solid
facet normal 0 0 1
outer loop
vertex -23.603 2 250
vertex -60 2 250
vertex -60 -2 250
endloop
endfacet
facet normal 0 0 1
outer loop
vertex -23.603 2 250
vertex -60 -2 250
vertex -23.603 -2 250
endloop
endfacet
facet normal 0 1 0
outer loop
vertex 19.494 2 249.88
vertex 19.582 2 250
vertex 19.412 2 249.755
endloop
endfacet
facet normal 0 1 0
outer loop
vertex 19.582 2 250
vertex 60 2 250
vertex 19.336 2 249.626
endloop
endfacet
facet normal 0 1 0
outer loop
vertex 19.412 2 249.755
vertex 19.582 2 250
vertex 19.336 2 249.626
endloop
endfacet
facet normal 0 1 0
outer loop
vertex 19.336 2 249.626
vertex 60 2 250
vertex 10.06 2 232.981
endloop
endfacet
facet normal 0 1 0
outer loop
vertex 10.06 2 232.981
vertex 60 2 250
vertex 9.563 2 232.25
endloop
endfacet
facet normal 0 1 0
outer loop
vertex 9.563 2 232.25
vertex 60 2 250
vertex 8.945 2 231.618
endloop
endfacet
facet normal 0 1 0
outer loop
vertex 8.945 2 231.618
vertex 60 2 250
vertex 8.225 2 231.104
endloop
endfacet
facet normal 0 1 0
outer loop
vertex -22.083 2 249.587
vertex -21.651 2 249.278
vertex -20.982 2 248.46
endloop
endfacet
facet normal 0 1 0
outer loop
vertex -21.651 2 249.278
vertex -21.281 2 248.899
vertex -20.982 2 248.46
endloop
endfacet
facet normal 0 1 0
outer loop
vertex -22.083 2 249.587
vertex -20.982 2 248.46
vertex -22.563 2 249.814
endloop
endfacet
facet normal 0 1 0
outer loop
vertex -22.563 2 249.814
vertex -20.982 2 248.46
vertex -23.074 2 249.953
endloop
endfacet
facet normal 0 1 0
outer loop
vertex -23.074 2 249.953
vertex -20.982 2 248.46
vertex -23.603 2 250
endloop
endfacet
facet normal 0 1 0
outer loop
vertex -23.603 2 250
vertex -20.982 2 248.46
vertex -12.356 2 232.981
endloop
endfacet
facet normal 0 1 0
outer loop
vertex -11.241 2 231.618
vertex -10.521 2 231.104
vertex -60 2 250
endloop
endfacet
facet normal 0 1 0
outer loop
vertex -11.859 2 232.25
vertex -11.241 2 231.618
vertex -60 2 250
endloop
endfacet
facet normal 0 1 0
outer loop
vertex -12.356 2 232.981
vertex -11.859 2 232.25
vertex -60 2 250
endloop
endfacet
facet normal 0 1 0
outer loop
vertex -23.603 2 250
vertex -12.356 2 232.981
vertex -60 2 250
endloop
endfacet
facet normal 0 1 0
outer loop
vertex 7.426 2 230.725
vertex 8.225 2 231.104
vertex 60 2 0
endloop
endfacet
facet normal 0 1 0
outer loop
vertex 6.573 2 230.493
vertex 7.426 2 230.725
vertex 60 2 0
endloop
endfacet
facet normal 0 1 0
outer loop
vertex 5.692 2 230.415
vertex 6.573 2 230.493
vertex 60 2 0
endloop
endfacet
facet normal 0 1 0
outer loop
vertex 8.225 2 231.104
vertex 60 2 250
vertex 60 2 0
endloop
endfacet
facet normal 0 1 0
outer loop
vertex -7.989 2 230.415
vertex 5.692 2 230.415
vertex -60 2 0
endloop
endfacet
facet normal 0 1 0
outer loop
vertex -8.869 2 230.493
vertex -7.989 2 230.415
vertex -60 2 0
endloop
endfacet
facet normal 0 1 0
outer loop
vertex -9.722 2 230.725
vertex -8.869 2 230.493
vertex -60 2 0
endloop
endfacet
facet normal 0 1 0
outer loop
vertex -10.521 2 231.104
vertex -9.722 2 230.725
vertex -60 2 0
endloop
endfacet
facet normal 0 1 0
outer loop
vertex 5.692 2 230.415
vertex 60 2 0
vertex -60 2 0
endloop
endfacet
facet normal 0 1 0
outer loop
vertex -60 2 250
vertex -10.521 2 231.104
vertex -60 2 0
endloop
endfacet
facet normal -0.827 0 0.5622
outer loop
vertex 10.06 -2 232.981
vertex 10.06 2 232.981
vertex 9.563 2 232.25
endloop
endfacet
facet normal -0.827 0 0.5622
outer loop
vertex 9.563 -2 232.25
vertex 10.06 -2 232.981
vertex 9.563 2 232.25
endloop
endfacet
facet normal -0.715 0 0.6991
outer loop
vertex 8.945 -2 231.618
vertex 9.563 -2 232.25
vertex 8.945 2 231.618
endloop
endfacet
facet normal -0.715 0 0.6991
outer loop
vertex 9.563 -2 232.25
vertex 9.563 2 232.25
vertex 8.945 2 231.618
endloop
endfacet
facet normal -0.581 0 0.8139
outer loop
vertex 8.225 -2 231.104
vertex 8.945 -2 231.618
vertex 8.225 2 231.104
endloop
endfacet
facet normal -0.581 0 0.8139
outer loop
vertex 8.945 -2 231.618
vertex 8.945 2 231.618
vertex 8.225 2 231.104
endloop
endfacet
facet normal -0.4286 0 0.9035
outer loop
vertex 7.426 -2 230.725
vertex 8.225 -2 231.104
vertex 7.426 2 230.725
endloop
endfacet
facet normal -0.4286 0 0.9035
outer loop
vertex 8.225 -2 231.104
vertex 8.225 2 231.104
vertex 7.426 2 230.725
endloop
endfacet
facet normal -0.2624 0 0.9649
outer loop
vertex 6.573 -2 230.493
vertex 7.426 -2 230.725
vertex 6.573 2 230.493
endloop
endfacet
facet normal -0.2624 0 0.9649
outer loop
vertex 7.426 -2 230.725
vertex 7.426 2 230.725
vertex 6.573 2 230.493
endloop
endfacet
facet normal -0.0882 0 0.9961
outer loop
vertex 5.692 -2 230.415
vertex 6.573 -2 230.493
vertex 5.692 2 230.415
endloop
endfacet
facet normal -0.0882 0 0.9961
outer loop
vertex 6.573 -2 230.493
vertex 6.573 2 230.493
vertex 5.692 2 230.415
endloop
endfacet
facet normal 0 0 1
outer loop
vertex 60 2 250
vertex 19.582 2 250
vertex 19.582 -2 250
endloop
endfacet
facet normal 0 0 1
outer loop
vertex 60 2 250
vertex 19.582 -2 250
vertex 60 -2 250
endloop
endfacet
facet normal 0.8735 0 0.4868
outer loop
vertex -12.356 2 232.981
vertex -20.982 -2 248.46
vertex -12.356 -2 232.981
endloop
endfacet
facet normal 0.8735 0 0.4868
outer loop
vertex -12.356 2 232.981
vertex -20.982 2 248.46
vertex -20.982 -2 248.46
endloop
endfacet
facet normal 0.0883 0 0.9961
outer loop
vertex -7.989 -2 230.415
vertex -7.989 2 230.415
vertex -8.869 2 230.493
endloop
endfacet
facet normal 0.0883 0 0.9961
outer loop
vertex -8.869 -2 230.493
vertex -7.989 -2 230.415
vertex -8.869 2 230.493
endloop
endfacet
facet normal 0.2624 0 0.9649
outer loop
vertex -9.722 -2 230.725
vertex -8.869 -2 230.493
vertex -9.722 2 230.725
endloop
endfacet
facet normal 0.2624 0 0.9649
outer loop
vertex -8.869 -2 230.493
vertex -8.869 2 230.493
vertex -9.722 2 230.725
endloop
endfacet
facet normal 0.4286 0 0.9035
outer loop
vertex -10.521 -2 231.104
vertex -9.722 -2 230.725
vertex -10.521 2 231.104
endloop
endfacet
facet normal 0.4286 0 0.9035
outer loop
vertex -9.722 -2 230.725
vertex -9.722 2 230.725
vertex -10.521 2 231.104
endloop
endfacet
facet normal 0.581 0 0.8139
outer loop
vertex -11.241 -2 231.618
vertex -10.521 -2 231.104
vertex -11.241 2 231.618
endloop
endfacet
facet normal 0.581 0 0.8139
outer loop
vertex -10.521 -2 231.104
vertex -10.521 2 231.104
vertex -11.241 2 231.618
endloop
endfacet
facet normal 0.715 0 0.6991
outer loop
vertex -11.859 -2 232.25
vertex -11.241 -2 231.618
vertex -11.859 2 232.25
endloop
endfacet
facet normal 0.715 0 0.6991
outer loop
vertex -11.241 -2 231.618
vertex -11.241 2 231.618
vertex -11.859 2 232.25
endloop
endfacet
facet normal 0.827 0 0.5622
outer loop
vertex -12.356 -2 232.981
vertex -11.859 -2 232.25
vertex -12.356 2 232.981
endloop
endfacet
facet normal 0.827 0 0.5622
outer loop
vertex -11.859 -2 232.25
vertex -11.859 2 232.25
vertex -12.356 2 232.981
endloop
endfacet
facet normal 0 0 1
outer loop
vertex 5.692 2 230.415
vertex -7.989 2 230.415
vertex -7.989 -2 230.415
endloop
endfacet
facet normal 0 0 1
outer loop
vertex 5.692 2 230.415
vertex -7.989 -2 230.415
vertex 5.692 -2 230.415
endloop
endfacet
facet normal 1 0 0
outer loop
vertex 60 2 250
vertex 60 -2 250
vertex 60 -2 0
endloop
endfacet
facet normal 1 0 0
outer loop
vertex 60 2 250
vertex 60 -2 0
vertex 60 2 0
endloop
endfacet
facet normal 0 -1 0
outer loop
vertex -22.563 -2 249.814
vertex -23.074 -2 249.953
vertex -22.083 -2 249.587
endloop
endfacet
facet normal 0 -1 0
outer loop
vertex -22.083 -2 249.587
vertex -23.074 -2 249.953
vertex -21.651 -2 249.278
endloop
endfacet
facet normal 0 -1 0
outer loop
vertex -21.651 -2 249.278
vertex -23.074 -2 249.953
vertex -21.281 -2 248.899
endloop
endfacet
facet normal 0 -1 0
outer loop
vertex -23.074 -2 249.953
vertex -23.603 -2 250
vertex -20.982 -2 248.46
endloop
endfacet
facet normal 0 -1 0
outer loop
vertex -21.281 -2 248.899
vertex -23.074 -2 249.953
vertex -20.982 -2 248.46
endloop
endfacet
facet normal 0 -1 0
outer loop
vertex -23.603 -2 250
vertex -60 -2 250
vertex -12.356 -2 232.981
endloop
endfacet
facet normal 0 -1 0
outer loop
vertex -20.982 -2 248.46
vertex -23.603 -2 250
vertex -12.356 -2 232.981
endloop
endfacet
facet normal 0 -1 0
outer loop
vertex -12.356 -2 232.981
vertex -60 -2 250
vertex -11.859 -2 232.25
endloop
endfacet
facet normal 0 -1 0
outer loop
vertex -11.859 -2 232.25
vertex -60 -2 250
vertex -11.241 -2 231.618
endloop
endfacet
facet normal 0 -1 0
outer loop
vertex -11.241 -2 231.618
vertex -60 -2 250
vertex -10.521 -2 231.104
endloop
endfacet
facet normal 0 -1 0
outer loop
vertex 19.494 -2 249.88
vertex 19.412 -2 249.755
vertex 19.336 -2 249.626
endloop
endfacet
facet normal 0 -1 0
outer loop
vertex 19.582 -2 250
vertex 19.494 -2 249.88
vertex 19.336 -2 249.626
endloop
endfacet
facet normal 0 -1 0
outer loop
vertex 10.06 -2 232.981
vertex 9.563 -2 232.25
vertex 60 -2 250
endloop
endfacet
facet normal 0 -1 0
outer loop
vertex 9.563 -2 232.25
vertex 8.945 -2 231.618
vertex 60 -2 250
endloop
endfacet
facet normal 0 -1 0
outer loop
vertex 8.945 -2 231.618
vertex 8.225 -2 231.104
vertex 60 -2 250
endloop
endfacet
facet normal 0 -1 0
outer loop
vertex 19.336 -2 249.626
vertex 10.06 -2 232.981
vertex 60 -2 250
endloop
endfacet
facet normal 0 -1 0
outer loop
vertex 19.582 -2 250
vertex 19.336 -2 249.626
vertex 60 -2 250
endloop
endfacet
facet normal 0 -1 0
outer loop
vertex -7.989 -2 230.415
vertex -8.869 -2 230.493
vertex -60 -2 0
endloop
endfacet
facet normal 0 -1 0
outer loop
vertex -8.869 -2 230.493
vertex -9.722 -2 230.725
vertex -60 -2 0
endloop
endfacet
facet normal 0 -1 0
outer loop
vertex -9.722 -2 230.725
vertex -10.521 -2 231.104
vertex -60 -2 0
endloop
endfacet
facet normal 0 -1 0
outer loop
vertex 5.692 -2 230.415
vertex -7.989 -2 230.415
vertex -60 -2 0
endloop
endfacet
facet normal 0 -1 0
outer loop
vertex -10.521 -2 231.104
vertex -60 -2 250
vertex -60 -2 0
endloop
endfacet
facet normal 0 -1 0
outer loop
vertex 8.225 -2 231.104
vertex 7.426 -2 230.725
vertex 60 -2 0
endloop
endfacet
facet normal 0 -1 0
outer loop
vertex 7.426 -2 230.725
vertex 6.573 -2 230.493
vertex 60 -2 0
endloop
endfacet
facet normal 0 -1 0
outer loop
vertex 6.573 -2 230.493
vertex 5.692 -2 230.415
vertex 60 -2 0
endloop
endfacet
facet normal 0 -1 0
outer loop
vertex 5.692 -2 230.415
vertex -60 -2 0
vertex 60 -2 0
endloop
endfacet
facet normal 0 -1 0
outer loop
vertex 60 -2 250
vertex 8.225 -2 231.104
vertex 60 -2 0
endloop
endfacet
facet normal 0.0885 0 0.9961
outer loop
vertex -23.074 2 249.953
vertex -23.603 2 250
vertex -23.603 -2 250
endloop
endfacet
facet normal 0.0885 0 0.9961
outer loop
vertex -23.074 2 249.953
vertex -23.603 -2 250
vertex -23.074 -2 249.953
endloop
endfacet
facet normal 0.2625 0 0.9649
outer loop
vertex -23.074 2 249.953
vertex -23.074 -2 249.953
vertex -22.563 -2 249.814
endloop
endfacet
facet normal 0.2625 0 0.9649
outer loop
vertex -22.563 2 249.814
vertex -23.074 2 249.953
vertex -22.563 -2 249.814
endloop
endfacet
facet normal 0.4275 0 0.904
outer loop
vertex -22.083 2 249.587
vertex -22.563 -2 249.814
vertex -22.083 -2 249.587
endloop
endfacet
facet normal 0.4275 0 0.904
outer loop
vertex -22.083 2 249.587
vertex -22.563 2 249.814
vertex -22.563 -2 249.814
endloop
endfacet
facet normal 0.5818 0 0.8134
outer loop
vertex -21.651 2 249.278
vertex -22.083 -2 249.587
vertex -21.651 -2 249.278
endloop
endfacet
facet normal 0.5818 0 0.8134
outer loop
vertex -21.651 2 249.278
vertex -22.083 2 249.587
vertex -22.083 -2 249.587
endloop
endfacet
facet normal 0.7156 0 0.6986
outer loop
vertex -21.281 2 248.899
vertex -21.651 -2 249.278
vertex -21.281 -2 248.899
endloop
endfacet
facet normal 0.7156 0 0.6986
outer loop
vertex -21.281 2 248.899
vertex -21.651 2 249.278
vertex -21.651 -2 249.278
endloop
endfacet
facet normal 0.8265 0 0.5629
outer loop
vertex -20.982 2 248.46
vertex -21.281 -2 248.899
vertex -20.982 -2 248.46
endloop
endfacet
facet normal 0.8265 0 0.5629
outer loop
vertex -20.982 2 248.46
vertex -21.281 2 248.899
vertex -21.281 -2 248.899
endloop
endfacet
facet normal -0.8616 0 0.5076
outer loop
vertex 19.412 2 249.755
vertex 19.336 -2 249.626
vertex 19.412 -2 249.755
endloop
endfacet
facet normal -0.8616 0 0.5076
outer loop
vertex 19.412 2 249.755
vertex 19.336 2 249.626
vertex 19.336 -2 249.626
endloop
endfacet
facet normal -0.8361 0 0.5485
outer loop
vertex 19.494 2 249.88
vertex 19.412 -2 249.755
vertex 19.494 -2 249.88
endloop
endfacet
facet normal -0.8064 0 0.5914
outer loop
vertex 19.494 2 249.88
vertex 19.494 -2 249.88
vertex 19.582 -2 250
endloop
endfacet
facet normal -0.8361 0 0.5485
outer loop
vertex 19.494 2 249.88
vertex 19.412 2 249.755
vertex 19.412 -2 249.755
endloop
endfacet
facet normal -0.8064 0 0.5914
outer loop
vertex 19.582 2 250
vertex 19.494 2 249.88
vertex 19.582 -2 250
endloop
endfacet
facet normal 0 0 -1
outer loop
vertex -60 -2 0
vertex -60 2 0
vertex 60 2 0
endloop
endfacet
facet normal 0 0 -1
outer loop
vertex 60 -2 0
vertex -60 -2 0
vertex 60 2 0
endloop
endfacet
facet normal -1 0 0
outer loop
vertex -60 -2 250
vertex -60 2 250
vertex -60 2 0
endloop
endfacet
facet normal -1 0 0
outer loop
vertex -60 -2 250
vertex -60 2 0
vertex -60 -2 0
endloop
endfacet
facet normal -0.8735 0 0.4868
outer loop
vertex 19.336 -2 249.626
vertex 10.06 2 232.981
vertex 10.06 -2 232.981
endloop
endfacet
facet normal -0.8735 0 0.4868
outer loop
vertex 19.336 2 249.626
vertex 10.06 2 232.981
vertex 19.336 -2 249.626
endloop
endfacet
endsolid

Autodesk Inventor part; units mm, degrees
ref_plane "YZ Plane" through (0, 0, 0) normal (1, 0, 0) x (0, 1, 0)
ref_plane "XZ Plane" through (0, 0, 0) normal (0, 1, 0) x (-1, 0, 0)
ref_plane "XY Plane" through (0, 0, 0) normal (0, 0, 1) x (1, 0, 0)
sketch "Эскиз1" plane through (0, 0, 0) normal (0, 0, 1) x (1, 0, 0)
  line L0 (60, 2) -> (-60, 2)
  line L1 (-60, 2) -> (-60, -2)
  line L2 (-60, -2) -> (60, -2)
  line L3 (60, -2) -> (60, 2)
  line L4 (60, 2) -> (-60, -2) construction
  line L5 (-60, 2) -> (60, -2) construction
  point P0 (0, 0)
  dimension "d0" = 120
  dimension "d1" = 4
extrude "Выдавливание1" add sketch "Эскиз1" along normal blind 250
sketch "Эскиз2" plane through (-60, 2, 0) normal (0, 1, 0) x (1, 0, 0)
  line L0 (39.0177, -248.4604) -> (47.6438, -232.9811)
  line L1 (52.0114, -230.415) -> (65.6925, -230.415)
  line L2 (70.0601, -232.9811) -> (79.336, -249.6263)
  arc A0 (79.336, -249.6263) -> (79.5824, -250) centre (81.9565, -248.166) ccw
  arc A1 (36.3971, -250) -> (39.0177, -248.4604) centre (36.3971, -247) ccw
  arc A2 (70.0601, -232.9811) -> (65.6925, -230.415) centre (65.6925, -235.415) ccw
  arc A3 (52.0114, -230.415) -> (47.6438, -232.9811) centre (52.0114, -235.415) ccw
  line L3 (79.5824, -250) -> (36.3971, -250)
  line L4 (0, -250) -> (120, -250) projected
  line L5 (120, -250) -> (0, -250) projected
  point P0 (60, 0)
  point P1 (58.852, -247.058)
  point P2 (39.5541, -247.4978)
  point P3 (49.0738, -230.415)
  point P4 (68.6301, -230.415)
  point P5 (78.1498, -247.4978)
  point P6 (60, -250)
  point P7 (60, -250)
  dimension "d9" = 3
  dimension "d10" = 5
  dimension "d11" = 19.585
extrude "Выдавливание2" cut sketch "Эскиз2" against normal blind 4
properties part number "поперечная грань тела"
